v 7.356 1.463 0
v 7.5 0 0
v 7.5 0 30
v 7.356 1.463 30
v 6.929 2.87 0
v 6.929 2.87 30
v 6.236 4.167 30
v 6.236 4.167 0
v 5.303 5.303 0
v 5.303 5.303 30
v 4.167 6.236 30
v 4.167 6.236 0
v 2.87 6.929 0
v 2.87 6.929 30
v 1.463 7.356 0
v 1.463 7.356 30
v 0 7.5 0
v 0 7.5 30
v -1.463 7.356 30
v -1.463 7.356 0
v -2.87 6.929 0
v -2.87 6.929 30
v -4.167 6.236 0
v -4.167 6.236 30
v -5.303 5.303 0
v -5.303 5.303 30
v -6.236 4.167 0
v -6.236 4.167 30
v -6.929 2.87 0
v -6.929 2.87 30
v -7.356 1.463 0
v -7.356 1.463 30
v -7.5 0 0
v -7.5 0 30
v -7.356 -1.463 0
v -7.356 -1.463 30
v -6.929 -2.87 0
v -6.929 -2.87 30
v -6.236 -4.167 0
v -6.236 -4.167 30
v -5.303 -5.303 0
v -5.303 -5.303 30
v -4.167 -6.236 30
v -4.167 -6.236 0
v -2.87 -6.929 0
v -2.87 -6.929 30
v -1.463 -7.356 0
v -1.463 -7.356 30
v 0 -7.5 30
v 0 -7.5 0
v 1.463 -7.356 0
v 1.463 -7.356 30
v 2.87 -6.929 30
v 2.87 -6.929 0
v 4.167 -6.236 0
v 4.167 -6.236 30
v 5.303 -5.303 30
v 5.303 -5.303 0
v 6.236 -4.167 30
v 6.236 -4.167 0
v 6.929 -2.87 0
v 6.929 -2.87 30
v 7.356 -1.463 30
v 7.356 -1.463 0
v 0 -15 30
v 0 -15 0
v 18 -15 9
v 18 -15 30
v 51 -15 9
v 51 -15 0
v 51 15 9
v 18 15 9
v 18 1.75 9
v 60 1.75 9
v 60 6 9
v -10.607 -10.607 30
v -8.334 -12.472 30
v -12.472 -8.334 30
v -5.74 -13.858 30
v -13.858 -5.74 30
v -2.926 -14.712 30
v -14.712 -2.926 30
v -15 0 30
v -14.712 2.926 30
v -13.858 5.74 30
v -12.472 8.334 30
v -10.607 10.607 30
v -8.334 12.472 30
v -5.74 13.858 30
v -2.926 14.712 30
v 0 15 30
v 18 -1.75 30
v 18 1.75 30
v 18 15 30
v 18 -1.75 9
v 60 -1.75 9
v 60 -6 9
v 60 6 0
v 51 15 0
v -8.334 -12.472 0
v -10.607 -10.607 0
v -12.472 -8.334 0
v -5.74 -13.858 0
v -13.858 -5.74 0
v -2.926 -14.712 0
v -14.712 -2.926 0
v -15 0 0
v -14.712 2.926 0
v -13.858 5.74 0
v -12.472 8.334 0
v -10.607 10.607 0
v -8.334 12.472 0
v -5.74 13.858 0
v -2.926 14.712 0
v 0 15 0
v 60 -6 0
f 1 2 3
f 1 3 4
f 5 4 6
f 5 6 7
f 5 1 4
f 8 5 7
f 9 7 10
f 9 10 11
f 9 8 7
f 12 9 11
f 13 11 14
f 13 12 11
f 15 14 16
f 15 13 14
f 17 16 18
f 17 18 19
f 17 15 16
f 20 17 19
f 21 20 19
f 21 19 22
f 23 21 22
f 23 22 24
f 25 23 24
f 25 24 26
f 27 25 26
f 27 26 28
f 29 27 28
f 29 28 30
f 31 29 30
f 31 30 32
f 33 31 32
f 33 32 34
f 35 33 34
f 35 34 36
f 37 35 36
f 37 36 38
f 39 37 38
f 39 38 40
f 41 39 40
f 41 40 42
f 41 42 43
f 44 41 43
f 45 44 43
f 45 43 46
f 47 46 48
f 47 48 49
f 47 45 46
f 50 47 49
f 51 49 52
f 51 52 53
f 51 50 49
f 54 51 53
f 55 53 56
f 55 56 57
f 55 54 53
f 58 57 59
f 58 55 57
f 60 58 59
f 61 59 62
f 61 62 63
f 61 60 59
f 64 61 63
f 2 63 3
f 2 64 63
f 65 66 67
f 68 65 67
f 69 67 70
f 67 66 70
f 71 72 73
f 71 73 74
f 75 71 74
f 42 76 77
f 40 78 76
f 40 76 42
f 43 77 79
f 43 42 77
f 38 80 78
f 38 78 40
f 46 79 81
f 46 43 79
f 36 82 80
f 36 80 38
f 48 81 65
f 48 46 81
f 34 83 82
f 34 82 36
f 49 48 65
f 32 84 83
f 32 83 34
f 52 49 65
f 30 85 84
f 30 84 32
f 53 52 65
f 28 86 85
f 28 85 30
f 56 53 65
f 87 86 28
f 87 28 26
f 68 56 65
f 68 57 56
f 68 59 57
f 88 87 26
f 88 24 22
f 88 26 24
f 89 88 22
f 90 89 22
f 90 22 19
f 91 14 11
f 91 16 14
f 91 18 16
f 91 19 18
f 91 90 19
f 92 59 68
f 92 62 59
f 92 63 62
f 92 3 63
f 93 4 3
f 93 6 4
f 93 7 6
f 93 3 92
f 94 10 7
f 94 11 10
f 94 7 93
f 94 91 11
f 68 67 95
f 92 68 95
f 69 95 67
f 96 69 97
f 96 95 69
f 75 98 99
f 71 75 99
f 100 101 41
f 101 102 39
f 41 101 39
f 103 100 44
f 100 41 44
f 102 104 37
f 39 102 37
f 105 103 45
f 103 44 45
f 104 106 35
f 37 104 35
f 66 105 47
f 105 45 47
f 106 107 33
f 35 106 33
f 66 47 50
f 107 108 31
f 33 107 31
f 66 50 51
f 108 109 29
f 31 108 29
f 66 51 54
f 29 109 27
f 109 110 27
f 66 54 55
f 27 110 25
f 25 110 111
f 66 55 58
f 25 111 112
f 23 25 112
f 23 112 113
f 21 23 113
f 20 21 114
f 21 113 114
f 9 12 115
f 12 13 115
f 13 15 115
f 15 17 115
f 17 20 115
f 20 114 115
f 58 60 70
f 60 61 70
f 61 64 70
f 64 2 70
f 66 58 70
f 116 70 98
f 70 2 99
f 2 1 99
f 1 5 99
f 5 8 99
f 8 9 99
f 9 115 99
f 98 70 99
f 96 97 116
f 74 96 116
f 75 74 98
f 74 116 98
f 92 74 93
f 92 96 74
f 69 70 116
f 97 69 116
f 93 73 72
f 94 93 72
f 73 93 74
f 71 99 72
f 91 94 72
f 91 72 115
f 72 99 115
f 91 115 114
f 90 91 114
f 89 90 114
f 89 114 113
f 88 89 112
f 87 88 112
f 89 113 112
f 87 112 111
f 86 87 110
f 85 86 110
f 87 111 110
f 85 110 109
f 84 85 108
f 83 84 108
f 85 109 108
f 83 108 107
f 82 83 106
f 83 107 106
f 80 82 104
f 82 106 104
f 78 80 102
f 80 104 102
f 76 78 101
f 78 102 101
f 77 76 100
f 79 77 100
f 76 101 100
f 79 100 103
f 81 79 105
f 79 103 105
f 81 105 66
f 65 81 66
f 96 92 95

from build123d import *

# Parameters (mm, degrees)
F0_R     = 7.5
F1_DEPTH = 30
F2_DEPTH = 9
F4_DEPTH = 1.75


with BuildPart() as f1:
    # F0 (on Top) → F1 (new body)
    with BuildSketch(Plane.XY):
        with BuildLine():
            Line((18, 15), (0, 15))
            ThreePointArc((0, 15), (-15, 0), (0, -15))
            Line((0, -15), (18, -15))
            Line((18, -15), (18, 15))
        make_face()
        Circle(F0_R, mode=Mode.SUBTRACT)
    extrude(amount=F1_DEPTH)

    # F0 (on Top) → F2 (join)
    with BuildSketch(Plane.XY):
        with BuildLine():
            Line((18, 15), (0, 15))
            ThreePointArc((0, 15), (-15, 0), (0, -15))
            Line((0, -15), (18, -15))
            Line((18, -15), (18, 15))
        make_face()
        Circle(F0_R, mode=Mode.SUBTRACT)
        Polygon((51, 15), (18, 15), (18, -15), (51, -15), (60, -6), (60, 6), align=None)
    extrude(amount=F2_DEPTH)

    # F3 (on Front) → F4 (join, symmetric)
    with BuildSketch(Plane.XZ):
        Polygon((60, 9), (18, 30), (18, 9), align=None)
    extrude(amount=F4_DEPTH, both=True)


solid = f1.part
